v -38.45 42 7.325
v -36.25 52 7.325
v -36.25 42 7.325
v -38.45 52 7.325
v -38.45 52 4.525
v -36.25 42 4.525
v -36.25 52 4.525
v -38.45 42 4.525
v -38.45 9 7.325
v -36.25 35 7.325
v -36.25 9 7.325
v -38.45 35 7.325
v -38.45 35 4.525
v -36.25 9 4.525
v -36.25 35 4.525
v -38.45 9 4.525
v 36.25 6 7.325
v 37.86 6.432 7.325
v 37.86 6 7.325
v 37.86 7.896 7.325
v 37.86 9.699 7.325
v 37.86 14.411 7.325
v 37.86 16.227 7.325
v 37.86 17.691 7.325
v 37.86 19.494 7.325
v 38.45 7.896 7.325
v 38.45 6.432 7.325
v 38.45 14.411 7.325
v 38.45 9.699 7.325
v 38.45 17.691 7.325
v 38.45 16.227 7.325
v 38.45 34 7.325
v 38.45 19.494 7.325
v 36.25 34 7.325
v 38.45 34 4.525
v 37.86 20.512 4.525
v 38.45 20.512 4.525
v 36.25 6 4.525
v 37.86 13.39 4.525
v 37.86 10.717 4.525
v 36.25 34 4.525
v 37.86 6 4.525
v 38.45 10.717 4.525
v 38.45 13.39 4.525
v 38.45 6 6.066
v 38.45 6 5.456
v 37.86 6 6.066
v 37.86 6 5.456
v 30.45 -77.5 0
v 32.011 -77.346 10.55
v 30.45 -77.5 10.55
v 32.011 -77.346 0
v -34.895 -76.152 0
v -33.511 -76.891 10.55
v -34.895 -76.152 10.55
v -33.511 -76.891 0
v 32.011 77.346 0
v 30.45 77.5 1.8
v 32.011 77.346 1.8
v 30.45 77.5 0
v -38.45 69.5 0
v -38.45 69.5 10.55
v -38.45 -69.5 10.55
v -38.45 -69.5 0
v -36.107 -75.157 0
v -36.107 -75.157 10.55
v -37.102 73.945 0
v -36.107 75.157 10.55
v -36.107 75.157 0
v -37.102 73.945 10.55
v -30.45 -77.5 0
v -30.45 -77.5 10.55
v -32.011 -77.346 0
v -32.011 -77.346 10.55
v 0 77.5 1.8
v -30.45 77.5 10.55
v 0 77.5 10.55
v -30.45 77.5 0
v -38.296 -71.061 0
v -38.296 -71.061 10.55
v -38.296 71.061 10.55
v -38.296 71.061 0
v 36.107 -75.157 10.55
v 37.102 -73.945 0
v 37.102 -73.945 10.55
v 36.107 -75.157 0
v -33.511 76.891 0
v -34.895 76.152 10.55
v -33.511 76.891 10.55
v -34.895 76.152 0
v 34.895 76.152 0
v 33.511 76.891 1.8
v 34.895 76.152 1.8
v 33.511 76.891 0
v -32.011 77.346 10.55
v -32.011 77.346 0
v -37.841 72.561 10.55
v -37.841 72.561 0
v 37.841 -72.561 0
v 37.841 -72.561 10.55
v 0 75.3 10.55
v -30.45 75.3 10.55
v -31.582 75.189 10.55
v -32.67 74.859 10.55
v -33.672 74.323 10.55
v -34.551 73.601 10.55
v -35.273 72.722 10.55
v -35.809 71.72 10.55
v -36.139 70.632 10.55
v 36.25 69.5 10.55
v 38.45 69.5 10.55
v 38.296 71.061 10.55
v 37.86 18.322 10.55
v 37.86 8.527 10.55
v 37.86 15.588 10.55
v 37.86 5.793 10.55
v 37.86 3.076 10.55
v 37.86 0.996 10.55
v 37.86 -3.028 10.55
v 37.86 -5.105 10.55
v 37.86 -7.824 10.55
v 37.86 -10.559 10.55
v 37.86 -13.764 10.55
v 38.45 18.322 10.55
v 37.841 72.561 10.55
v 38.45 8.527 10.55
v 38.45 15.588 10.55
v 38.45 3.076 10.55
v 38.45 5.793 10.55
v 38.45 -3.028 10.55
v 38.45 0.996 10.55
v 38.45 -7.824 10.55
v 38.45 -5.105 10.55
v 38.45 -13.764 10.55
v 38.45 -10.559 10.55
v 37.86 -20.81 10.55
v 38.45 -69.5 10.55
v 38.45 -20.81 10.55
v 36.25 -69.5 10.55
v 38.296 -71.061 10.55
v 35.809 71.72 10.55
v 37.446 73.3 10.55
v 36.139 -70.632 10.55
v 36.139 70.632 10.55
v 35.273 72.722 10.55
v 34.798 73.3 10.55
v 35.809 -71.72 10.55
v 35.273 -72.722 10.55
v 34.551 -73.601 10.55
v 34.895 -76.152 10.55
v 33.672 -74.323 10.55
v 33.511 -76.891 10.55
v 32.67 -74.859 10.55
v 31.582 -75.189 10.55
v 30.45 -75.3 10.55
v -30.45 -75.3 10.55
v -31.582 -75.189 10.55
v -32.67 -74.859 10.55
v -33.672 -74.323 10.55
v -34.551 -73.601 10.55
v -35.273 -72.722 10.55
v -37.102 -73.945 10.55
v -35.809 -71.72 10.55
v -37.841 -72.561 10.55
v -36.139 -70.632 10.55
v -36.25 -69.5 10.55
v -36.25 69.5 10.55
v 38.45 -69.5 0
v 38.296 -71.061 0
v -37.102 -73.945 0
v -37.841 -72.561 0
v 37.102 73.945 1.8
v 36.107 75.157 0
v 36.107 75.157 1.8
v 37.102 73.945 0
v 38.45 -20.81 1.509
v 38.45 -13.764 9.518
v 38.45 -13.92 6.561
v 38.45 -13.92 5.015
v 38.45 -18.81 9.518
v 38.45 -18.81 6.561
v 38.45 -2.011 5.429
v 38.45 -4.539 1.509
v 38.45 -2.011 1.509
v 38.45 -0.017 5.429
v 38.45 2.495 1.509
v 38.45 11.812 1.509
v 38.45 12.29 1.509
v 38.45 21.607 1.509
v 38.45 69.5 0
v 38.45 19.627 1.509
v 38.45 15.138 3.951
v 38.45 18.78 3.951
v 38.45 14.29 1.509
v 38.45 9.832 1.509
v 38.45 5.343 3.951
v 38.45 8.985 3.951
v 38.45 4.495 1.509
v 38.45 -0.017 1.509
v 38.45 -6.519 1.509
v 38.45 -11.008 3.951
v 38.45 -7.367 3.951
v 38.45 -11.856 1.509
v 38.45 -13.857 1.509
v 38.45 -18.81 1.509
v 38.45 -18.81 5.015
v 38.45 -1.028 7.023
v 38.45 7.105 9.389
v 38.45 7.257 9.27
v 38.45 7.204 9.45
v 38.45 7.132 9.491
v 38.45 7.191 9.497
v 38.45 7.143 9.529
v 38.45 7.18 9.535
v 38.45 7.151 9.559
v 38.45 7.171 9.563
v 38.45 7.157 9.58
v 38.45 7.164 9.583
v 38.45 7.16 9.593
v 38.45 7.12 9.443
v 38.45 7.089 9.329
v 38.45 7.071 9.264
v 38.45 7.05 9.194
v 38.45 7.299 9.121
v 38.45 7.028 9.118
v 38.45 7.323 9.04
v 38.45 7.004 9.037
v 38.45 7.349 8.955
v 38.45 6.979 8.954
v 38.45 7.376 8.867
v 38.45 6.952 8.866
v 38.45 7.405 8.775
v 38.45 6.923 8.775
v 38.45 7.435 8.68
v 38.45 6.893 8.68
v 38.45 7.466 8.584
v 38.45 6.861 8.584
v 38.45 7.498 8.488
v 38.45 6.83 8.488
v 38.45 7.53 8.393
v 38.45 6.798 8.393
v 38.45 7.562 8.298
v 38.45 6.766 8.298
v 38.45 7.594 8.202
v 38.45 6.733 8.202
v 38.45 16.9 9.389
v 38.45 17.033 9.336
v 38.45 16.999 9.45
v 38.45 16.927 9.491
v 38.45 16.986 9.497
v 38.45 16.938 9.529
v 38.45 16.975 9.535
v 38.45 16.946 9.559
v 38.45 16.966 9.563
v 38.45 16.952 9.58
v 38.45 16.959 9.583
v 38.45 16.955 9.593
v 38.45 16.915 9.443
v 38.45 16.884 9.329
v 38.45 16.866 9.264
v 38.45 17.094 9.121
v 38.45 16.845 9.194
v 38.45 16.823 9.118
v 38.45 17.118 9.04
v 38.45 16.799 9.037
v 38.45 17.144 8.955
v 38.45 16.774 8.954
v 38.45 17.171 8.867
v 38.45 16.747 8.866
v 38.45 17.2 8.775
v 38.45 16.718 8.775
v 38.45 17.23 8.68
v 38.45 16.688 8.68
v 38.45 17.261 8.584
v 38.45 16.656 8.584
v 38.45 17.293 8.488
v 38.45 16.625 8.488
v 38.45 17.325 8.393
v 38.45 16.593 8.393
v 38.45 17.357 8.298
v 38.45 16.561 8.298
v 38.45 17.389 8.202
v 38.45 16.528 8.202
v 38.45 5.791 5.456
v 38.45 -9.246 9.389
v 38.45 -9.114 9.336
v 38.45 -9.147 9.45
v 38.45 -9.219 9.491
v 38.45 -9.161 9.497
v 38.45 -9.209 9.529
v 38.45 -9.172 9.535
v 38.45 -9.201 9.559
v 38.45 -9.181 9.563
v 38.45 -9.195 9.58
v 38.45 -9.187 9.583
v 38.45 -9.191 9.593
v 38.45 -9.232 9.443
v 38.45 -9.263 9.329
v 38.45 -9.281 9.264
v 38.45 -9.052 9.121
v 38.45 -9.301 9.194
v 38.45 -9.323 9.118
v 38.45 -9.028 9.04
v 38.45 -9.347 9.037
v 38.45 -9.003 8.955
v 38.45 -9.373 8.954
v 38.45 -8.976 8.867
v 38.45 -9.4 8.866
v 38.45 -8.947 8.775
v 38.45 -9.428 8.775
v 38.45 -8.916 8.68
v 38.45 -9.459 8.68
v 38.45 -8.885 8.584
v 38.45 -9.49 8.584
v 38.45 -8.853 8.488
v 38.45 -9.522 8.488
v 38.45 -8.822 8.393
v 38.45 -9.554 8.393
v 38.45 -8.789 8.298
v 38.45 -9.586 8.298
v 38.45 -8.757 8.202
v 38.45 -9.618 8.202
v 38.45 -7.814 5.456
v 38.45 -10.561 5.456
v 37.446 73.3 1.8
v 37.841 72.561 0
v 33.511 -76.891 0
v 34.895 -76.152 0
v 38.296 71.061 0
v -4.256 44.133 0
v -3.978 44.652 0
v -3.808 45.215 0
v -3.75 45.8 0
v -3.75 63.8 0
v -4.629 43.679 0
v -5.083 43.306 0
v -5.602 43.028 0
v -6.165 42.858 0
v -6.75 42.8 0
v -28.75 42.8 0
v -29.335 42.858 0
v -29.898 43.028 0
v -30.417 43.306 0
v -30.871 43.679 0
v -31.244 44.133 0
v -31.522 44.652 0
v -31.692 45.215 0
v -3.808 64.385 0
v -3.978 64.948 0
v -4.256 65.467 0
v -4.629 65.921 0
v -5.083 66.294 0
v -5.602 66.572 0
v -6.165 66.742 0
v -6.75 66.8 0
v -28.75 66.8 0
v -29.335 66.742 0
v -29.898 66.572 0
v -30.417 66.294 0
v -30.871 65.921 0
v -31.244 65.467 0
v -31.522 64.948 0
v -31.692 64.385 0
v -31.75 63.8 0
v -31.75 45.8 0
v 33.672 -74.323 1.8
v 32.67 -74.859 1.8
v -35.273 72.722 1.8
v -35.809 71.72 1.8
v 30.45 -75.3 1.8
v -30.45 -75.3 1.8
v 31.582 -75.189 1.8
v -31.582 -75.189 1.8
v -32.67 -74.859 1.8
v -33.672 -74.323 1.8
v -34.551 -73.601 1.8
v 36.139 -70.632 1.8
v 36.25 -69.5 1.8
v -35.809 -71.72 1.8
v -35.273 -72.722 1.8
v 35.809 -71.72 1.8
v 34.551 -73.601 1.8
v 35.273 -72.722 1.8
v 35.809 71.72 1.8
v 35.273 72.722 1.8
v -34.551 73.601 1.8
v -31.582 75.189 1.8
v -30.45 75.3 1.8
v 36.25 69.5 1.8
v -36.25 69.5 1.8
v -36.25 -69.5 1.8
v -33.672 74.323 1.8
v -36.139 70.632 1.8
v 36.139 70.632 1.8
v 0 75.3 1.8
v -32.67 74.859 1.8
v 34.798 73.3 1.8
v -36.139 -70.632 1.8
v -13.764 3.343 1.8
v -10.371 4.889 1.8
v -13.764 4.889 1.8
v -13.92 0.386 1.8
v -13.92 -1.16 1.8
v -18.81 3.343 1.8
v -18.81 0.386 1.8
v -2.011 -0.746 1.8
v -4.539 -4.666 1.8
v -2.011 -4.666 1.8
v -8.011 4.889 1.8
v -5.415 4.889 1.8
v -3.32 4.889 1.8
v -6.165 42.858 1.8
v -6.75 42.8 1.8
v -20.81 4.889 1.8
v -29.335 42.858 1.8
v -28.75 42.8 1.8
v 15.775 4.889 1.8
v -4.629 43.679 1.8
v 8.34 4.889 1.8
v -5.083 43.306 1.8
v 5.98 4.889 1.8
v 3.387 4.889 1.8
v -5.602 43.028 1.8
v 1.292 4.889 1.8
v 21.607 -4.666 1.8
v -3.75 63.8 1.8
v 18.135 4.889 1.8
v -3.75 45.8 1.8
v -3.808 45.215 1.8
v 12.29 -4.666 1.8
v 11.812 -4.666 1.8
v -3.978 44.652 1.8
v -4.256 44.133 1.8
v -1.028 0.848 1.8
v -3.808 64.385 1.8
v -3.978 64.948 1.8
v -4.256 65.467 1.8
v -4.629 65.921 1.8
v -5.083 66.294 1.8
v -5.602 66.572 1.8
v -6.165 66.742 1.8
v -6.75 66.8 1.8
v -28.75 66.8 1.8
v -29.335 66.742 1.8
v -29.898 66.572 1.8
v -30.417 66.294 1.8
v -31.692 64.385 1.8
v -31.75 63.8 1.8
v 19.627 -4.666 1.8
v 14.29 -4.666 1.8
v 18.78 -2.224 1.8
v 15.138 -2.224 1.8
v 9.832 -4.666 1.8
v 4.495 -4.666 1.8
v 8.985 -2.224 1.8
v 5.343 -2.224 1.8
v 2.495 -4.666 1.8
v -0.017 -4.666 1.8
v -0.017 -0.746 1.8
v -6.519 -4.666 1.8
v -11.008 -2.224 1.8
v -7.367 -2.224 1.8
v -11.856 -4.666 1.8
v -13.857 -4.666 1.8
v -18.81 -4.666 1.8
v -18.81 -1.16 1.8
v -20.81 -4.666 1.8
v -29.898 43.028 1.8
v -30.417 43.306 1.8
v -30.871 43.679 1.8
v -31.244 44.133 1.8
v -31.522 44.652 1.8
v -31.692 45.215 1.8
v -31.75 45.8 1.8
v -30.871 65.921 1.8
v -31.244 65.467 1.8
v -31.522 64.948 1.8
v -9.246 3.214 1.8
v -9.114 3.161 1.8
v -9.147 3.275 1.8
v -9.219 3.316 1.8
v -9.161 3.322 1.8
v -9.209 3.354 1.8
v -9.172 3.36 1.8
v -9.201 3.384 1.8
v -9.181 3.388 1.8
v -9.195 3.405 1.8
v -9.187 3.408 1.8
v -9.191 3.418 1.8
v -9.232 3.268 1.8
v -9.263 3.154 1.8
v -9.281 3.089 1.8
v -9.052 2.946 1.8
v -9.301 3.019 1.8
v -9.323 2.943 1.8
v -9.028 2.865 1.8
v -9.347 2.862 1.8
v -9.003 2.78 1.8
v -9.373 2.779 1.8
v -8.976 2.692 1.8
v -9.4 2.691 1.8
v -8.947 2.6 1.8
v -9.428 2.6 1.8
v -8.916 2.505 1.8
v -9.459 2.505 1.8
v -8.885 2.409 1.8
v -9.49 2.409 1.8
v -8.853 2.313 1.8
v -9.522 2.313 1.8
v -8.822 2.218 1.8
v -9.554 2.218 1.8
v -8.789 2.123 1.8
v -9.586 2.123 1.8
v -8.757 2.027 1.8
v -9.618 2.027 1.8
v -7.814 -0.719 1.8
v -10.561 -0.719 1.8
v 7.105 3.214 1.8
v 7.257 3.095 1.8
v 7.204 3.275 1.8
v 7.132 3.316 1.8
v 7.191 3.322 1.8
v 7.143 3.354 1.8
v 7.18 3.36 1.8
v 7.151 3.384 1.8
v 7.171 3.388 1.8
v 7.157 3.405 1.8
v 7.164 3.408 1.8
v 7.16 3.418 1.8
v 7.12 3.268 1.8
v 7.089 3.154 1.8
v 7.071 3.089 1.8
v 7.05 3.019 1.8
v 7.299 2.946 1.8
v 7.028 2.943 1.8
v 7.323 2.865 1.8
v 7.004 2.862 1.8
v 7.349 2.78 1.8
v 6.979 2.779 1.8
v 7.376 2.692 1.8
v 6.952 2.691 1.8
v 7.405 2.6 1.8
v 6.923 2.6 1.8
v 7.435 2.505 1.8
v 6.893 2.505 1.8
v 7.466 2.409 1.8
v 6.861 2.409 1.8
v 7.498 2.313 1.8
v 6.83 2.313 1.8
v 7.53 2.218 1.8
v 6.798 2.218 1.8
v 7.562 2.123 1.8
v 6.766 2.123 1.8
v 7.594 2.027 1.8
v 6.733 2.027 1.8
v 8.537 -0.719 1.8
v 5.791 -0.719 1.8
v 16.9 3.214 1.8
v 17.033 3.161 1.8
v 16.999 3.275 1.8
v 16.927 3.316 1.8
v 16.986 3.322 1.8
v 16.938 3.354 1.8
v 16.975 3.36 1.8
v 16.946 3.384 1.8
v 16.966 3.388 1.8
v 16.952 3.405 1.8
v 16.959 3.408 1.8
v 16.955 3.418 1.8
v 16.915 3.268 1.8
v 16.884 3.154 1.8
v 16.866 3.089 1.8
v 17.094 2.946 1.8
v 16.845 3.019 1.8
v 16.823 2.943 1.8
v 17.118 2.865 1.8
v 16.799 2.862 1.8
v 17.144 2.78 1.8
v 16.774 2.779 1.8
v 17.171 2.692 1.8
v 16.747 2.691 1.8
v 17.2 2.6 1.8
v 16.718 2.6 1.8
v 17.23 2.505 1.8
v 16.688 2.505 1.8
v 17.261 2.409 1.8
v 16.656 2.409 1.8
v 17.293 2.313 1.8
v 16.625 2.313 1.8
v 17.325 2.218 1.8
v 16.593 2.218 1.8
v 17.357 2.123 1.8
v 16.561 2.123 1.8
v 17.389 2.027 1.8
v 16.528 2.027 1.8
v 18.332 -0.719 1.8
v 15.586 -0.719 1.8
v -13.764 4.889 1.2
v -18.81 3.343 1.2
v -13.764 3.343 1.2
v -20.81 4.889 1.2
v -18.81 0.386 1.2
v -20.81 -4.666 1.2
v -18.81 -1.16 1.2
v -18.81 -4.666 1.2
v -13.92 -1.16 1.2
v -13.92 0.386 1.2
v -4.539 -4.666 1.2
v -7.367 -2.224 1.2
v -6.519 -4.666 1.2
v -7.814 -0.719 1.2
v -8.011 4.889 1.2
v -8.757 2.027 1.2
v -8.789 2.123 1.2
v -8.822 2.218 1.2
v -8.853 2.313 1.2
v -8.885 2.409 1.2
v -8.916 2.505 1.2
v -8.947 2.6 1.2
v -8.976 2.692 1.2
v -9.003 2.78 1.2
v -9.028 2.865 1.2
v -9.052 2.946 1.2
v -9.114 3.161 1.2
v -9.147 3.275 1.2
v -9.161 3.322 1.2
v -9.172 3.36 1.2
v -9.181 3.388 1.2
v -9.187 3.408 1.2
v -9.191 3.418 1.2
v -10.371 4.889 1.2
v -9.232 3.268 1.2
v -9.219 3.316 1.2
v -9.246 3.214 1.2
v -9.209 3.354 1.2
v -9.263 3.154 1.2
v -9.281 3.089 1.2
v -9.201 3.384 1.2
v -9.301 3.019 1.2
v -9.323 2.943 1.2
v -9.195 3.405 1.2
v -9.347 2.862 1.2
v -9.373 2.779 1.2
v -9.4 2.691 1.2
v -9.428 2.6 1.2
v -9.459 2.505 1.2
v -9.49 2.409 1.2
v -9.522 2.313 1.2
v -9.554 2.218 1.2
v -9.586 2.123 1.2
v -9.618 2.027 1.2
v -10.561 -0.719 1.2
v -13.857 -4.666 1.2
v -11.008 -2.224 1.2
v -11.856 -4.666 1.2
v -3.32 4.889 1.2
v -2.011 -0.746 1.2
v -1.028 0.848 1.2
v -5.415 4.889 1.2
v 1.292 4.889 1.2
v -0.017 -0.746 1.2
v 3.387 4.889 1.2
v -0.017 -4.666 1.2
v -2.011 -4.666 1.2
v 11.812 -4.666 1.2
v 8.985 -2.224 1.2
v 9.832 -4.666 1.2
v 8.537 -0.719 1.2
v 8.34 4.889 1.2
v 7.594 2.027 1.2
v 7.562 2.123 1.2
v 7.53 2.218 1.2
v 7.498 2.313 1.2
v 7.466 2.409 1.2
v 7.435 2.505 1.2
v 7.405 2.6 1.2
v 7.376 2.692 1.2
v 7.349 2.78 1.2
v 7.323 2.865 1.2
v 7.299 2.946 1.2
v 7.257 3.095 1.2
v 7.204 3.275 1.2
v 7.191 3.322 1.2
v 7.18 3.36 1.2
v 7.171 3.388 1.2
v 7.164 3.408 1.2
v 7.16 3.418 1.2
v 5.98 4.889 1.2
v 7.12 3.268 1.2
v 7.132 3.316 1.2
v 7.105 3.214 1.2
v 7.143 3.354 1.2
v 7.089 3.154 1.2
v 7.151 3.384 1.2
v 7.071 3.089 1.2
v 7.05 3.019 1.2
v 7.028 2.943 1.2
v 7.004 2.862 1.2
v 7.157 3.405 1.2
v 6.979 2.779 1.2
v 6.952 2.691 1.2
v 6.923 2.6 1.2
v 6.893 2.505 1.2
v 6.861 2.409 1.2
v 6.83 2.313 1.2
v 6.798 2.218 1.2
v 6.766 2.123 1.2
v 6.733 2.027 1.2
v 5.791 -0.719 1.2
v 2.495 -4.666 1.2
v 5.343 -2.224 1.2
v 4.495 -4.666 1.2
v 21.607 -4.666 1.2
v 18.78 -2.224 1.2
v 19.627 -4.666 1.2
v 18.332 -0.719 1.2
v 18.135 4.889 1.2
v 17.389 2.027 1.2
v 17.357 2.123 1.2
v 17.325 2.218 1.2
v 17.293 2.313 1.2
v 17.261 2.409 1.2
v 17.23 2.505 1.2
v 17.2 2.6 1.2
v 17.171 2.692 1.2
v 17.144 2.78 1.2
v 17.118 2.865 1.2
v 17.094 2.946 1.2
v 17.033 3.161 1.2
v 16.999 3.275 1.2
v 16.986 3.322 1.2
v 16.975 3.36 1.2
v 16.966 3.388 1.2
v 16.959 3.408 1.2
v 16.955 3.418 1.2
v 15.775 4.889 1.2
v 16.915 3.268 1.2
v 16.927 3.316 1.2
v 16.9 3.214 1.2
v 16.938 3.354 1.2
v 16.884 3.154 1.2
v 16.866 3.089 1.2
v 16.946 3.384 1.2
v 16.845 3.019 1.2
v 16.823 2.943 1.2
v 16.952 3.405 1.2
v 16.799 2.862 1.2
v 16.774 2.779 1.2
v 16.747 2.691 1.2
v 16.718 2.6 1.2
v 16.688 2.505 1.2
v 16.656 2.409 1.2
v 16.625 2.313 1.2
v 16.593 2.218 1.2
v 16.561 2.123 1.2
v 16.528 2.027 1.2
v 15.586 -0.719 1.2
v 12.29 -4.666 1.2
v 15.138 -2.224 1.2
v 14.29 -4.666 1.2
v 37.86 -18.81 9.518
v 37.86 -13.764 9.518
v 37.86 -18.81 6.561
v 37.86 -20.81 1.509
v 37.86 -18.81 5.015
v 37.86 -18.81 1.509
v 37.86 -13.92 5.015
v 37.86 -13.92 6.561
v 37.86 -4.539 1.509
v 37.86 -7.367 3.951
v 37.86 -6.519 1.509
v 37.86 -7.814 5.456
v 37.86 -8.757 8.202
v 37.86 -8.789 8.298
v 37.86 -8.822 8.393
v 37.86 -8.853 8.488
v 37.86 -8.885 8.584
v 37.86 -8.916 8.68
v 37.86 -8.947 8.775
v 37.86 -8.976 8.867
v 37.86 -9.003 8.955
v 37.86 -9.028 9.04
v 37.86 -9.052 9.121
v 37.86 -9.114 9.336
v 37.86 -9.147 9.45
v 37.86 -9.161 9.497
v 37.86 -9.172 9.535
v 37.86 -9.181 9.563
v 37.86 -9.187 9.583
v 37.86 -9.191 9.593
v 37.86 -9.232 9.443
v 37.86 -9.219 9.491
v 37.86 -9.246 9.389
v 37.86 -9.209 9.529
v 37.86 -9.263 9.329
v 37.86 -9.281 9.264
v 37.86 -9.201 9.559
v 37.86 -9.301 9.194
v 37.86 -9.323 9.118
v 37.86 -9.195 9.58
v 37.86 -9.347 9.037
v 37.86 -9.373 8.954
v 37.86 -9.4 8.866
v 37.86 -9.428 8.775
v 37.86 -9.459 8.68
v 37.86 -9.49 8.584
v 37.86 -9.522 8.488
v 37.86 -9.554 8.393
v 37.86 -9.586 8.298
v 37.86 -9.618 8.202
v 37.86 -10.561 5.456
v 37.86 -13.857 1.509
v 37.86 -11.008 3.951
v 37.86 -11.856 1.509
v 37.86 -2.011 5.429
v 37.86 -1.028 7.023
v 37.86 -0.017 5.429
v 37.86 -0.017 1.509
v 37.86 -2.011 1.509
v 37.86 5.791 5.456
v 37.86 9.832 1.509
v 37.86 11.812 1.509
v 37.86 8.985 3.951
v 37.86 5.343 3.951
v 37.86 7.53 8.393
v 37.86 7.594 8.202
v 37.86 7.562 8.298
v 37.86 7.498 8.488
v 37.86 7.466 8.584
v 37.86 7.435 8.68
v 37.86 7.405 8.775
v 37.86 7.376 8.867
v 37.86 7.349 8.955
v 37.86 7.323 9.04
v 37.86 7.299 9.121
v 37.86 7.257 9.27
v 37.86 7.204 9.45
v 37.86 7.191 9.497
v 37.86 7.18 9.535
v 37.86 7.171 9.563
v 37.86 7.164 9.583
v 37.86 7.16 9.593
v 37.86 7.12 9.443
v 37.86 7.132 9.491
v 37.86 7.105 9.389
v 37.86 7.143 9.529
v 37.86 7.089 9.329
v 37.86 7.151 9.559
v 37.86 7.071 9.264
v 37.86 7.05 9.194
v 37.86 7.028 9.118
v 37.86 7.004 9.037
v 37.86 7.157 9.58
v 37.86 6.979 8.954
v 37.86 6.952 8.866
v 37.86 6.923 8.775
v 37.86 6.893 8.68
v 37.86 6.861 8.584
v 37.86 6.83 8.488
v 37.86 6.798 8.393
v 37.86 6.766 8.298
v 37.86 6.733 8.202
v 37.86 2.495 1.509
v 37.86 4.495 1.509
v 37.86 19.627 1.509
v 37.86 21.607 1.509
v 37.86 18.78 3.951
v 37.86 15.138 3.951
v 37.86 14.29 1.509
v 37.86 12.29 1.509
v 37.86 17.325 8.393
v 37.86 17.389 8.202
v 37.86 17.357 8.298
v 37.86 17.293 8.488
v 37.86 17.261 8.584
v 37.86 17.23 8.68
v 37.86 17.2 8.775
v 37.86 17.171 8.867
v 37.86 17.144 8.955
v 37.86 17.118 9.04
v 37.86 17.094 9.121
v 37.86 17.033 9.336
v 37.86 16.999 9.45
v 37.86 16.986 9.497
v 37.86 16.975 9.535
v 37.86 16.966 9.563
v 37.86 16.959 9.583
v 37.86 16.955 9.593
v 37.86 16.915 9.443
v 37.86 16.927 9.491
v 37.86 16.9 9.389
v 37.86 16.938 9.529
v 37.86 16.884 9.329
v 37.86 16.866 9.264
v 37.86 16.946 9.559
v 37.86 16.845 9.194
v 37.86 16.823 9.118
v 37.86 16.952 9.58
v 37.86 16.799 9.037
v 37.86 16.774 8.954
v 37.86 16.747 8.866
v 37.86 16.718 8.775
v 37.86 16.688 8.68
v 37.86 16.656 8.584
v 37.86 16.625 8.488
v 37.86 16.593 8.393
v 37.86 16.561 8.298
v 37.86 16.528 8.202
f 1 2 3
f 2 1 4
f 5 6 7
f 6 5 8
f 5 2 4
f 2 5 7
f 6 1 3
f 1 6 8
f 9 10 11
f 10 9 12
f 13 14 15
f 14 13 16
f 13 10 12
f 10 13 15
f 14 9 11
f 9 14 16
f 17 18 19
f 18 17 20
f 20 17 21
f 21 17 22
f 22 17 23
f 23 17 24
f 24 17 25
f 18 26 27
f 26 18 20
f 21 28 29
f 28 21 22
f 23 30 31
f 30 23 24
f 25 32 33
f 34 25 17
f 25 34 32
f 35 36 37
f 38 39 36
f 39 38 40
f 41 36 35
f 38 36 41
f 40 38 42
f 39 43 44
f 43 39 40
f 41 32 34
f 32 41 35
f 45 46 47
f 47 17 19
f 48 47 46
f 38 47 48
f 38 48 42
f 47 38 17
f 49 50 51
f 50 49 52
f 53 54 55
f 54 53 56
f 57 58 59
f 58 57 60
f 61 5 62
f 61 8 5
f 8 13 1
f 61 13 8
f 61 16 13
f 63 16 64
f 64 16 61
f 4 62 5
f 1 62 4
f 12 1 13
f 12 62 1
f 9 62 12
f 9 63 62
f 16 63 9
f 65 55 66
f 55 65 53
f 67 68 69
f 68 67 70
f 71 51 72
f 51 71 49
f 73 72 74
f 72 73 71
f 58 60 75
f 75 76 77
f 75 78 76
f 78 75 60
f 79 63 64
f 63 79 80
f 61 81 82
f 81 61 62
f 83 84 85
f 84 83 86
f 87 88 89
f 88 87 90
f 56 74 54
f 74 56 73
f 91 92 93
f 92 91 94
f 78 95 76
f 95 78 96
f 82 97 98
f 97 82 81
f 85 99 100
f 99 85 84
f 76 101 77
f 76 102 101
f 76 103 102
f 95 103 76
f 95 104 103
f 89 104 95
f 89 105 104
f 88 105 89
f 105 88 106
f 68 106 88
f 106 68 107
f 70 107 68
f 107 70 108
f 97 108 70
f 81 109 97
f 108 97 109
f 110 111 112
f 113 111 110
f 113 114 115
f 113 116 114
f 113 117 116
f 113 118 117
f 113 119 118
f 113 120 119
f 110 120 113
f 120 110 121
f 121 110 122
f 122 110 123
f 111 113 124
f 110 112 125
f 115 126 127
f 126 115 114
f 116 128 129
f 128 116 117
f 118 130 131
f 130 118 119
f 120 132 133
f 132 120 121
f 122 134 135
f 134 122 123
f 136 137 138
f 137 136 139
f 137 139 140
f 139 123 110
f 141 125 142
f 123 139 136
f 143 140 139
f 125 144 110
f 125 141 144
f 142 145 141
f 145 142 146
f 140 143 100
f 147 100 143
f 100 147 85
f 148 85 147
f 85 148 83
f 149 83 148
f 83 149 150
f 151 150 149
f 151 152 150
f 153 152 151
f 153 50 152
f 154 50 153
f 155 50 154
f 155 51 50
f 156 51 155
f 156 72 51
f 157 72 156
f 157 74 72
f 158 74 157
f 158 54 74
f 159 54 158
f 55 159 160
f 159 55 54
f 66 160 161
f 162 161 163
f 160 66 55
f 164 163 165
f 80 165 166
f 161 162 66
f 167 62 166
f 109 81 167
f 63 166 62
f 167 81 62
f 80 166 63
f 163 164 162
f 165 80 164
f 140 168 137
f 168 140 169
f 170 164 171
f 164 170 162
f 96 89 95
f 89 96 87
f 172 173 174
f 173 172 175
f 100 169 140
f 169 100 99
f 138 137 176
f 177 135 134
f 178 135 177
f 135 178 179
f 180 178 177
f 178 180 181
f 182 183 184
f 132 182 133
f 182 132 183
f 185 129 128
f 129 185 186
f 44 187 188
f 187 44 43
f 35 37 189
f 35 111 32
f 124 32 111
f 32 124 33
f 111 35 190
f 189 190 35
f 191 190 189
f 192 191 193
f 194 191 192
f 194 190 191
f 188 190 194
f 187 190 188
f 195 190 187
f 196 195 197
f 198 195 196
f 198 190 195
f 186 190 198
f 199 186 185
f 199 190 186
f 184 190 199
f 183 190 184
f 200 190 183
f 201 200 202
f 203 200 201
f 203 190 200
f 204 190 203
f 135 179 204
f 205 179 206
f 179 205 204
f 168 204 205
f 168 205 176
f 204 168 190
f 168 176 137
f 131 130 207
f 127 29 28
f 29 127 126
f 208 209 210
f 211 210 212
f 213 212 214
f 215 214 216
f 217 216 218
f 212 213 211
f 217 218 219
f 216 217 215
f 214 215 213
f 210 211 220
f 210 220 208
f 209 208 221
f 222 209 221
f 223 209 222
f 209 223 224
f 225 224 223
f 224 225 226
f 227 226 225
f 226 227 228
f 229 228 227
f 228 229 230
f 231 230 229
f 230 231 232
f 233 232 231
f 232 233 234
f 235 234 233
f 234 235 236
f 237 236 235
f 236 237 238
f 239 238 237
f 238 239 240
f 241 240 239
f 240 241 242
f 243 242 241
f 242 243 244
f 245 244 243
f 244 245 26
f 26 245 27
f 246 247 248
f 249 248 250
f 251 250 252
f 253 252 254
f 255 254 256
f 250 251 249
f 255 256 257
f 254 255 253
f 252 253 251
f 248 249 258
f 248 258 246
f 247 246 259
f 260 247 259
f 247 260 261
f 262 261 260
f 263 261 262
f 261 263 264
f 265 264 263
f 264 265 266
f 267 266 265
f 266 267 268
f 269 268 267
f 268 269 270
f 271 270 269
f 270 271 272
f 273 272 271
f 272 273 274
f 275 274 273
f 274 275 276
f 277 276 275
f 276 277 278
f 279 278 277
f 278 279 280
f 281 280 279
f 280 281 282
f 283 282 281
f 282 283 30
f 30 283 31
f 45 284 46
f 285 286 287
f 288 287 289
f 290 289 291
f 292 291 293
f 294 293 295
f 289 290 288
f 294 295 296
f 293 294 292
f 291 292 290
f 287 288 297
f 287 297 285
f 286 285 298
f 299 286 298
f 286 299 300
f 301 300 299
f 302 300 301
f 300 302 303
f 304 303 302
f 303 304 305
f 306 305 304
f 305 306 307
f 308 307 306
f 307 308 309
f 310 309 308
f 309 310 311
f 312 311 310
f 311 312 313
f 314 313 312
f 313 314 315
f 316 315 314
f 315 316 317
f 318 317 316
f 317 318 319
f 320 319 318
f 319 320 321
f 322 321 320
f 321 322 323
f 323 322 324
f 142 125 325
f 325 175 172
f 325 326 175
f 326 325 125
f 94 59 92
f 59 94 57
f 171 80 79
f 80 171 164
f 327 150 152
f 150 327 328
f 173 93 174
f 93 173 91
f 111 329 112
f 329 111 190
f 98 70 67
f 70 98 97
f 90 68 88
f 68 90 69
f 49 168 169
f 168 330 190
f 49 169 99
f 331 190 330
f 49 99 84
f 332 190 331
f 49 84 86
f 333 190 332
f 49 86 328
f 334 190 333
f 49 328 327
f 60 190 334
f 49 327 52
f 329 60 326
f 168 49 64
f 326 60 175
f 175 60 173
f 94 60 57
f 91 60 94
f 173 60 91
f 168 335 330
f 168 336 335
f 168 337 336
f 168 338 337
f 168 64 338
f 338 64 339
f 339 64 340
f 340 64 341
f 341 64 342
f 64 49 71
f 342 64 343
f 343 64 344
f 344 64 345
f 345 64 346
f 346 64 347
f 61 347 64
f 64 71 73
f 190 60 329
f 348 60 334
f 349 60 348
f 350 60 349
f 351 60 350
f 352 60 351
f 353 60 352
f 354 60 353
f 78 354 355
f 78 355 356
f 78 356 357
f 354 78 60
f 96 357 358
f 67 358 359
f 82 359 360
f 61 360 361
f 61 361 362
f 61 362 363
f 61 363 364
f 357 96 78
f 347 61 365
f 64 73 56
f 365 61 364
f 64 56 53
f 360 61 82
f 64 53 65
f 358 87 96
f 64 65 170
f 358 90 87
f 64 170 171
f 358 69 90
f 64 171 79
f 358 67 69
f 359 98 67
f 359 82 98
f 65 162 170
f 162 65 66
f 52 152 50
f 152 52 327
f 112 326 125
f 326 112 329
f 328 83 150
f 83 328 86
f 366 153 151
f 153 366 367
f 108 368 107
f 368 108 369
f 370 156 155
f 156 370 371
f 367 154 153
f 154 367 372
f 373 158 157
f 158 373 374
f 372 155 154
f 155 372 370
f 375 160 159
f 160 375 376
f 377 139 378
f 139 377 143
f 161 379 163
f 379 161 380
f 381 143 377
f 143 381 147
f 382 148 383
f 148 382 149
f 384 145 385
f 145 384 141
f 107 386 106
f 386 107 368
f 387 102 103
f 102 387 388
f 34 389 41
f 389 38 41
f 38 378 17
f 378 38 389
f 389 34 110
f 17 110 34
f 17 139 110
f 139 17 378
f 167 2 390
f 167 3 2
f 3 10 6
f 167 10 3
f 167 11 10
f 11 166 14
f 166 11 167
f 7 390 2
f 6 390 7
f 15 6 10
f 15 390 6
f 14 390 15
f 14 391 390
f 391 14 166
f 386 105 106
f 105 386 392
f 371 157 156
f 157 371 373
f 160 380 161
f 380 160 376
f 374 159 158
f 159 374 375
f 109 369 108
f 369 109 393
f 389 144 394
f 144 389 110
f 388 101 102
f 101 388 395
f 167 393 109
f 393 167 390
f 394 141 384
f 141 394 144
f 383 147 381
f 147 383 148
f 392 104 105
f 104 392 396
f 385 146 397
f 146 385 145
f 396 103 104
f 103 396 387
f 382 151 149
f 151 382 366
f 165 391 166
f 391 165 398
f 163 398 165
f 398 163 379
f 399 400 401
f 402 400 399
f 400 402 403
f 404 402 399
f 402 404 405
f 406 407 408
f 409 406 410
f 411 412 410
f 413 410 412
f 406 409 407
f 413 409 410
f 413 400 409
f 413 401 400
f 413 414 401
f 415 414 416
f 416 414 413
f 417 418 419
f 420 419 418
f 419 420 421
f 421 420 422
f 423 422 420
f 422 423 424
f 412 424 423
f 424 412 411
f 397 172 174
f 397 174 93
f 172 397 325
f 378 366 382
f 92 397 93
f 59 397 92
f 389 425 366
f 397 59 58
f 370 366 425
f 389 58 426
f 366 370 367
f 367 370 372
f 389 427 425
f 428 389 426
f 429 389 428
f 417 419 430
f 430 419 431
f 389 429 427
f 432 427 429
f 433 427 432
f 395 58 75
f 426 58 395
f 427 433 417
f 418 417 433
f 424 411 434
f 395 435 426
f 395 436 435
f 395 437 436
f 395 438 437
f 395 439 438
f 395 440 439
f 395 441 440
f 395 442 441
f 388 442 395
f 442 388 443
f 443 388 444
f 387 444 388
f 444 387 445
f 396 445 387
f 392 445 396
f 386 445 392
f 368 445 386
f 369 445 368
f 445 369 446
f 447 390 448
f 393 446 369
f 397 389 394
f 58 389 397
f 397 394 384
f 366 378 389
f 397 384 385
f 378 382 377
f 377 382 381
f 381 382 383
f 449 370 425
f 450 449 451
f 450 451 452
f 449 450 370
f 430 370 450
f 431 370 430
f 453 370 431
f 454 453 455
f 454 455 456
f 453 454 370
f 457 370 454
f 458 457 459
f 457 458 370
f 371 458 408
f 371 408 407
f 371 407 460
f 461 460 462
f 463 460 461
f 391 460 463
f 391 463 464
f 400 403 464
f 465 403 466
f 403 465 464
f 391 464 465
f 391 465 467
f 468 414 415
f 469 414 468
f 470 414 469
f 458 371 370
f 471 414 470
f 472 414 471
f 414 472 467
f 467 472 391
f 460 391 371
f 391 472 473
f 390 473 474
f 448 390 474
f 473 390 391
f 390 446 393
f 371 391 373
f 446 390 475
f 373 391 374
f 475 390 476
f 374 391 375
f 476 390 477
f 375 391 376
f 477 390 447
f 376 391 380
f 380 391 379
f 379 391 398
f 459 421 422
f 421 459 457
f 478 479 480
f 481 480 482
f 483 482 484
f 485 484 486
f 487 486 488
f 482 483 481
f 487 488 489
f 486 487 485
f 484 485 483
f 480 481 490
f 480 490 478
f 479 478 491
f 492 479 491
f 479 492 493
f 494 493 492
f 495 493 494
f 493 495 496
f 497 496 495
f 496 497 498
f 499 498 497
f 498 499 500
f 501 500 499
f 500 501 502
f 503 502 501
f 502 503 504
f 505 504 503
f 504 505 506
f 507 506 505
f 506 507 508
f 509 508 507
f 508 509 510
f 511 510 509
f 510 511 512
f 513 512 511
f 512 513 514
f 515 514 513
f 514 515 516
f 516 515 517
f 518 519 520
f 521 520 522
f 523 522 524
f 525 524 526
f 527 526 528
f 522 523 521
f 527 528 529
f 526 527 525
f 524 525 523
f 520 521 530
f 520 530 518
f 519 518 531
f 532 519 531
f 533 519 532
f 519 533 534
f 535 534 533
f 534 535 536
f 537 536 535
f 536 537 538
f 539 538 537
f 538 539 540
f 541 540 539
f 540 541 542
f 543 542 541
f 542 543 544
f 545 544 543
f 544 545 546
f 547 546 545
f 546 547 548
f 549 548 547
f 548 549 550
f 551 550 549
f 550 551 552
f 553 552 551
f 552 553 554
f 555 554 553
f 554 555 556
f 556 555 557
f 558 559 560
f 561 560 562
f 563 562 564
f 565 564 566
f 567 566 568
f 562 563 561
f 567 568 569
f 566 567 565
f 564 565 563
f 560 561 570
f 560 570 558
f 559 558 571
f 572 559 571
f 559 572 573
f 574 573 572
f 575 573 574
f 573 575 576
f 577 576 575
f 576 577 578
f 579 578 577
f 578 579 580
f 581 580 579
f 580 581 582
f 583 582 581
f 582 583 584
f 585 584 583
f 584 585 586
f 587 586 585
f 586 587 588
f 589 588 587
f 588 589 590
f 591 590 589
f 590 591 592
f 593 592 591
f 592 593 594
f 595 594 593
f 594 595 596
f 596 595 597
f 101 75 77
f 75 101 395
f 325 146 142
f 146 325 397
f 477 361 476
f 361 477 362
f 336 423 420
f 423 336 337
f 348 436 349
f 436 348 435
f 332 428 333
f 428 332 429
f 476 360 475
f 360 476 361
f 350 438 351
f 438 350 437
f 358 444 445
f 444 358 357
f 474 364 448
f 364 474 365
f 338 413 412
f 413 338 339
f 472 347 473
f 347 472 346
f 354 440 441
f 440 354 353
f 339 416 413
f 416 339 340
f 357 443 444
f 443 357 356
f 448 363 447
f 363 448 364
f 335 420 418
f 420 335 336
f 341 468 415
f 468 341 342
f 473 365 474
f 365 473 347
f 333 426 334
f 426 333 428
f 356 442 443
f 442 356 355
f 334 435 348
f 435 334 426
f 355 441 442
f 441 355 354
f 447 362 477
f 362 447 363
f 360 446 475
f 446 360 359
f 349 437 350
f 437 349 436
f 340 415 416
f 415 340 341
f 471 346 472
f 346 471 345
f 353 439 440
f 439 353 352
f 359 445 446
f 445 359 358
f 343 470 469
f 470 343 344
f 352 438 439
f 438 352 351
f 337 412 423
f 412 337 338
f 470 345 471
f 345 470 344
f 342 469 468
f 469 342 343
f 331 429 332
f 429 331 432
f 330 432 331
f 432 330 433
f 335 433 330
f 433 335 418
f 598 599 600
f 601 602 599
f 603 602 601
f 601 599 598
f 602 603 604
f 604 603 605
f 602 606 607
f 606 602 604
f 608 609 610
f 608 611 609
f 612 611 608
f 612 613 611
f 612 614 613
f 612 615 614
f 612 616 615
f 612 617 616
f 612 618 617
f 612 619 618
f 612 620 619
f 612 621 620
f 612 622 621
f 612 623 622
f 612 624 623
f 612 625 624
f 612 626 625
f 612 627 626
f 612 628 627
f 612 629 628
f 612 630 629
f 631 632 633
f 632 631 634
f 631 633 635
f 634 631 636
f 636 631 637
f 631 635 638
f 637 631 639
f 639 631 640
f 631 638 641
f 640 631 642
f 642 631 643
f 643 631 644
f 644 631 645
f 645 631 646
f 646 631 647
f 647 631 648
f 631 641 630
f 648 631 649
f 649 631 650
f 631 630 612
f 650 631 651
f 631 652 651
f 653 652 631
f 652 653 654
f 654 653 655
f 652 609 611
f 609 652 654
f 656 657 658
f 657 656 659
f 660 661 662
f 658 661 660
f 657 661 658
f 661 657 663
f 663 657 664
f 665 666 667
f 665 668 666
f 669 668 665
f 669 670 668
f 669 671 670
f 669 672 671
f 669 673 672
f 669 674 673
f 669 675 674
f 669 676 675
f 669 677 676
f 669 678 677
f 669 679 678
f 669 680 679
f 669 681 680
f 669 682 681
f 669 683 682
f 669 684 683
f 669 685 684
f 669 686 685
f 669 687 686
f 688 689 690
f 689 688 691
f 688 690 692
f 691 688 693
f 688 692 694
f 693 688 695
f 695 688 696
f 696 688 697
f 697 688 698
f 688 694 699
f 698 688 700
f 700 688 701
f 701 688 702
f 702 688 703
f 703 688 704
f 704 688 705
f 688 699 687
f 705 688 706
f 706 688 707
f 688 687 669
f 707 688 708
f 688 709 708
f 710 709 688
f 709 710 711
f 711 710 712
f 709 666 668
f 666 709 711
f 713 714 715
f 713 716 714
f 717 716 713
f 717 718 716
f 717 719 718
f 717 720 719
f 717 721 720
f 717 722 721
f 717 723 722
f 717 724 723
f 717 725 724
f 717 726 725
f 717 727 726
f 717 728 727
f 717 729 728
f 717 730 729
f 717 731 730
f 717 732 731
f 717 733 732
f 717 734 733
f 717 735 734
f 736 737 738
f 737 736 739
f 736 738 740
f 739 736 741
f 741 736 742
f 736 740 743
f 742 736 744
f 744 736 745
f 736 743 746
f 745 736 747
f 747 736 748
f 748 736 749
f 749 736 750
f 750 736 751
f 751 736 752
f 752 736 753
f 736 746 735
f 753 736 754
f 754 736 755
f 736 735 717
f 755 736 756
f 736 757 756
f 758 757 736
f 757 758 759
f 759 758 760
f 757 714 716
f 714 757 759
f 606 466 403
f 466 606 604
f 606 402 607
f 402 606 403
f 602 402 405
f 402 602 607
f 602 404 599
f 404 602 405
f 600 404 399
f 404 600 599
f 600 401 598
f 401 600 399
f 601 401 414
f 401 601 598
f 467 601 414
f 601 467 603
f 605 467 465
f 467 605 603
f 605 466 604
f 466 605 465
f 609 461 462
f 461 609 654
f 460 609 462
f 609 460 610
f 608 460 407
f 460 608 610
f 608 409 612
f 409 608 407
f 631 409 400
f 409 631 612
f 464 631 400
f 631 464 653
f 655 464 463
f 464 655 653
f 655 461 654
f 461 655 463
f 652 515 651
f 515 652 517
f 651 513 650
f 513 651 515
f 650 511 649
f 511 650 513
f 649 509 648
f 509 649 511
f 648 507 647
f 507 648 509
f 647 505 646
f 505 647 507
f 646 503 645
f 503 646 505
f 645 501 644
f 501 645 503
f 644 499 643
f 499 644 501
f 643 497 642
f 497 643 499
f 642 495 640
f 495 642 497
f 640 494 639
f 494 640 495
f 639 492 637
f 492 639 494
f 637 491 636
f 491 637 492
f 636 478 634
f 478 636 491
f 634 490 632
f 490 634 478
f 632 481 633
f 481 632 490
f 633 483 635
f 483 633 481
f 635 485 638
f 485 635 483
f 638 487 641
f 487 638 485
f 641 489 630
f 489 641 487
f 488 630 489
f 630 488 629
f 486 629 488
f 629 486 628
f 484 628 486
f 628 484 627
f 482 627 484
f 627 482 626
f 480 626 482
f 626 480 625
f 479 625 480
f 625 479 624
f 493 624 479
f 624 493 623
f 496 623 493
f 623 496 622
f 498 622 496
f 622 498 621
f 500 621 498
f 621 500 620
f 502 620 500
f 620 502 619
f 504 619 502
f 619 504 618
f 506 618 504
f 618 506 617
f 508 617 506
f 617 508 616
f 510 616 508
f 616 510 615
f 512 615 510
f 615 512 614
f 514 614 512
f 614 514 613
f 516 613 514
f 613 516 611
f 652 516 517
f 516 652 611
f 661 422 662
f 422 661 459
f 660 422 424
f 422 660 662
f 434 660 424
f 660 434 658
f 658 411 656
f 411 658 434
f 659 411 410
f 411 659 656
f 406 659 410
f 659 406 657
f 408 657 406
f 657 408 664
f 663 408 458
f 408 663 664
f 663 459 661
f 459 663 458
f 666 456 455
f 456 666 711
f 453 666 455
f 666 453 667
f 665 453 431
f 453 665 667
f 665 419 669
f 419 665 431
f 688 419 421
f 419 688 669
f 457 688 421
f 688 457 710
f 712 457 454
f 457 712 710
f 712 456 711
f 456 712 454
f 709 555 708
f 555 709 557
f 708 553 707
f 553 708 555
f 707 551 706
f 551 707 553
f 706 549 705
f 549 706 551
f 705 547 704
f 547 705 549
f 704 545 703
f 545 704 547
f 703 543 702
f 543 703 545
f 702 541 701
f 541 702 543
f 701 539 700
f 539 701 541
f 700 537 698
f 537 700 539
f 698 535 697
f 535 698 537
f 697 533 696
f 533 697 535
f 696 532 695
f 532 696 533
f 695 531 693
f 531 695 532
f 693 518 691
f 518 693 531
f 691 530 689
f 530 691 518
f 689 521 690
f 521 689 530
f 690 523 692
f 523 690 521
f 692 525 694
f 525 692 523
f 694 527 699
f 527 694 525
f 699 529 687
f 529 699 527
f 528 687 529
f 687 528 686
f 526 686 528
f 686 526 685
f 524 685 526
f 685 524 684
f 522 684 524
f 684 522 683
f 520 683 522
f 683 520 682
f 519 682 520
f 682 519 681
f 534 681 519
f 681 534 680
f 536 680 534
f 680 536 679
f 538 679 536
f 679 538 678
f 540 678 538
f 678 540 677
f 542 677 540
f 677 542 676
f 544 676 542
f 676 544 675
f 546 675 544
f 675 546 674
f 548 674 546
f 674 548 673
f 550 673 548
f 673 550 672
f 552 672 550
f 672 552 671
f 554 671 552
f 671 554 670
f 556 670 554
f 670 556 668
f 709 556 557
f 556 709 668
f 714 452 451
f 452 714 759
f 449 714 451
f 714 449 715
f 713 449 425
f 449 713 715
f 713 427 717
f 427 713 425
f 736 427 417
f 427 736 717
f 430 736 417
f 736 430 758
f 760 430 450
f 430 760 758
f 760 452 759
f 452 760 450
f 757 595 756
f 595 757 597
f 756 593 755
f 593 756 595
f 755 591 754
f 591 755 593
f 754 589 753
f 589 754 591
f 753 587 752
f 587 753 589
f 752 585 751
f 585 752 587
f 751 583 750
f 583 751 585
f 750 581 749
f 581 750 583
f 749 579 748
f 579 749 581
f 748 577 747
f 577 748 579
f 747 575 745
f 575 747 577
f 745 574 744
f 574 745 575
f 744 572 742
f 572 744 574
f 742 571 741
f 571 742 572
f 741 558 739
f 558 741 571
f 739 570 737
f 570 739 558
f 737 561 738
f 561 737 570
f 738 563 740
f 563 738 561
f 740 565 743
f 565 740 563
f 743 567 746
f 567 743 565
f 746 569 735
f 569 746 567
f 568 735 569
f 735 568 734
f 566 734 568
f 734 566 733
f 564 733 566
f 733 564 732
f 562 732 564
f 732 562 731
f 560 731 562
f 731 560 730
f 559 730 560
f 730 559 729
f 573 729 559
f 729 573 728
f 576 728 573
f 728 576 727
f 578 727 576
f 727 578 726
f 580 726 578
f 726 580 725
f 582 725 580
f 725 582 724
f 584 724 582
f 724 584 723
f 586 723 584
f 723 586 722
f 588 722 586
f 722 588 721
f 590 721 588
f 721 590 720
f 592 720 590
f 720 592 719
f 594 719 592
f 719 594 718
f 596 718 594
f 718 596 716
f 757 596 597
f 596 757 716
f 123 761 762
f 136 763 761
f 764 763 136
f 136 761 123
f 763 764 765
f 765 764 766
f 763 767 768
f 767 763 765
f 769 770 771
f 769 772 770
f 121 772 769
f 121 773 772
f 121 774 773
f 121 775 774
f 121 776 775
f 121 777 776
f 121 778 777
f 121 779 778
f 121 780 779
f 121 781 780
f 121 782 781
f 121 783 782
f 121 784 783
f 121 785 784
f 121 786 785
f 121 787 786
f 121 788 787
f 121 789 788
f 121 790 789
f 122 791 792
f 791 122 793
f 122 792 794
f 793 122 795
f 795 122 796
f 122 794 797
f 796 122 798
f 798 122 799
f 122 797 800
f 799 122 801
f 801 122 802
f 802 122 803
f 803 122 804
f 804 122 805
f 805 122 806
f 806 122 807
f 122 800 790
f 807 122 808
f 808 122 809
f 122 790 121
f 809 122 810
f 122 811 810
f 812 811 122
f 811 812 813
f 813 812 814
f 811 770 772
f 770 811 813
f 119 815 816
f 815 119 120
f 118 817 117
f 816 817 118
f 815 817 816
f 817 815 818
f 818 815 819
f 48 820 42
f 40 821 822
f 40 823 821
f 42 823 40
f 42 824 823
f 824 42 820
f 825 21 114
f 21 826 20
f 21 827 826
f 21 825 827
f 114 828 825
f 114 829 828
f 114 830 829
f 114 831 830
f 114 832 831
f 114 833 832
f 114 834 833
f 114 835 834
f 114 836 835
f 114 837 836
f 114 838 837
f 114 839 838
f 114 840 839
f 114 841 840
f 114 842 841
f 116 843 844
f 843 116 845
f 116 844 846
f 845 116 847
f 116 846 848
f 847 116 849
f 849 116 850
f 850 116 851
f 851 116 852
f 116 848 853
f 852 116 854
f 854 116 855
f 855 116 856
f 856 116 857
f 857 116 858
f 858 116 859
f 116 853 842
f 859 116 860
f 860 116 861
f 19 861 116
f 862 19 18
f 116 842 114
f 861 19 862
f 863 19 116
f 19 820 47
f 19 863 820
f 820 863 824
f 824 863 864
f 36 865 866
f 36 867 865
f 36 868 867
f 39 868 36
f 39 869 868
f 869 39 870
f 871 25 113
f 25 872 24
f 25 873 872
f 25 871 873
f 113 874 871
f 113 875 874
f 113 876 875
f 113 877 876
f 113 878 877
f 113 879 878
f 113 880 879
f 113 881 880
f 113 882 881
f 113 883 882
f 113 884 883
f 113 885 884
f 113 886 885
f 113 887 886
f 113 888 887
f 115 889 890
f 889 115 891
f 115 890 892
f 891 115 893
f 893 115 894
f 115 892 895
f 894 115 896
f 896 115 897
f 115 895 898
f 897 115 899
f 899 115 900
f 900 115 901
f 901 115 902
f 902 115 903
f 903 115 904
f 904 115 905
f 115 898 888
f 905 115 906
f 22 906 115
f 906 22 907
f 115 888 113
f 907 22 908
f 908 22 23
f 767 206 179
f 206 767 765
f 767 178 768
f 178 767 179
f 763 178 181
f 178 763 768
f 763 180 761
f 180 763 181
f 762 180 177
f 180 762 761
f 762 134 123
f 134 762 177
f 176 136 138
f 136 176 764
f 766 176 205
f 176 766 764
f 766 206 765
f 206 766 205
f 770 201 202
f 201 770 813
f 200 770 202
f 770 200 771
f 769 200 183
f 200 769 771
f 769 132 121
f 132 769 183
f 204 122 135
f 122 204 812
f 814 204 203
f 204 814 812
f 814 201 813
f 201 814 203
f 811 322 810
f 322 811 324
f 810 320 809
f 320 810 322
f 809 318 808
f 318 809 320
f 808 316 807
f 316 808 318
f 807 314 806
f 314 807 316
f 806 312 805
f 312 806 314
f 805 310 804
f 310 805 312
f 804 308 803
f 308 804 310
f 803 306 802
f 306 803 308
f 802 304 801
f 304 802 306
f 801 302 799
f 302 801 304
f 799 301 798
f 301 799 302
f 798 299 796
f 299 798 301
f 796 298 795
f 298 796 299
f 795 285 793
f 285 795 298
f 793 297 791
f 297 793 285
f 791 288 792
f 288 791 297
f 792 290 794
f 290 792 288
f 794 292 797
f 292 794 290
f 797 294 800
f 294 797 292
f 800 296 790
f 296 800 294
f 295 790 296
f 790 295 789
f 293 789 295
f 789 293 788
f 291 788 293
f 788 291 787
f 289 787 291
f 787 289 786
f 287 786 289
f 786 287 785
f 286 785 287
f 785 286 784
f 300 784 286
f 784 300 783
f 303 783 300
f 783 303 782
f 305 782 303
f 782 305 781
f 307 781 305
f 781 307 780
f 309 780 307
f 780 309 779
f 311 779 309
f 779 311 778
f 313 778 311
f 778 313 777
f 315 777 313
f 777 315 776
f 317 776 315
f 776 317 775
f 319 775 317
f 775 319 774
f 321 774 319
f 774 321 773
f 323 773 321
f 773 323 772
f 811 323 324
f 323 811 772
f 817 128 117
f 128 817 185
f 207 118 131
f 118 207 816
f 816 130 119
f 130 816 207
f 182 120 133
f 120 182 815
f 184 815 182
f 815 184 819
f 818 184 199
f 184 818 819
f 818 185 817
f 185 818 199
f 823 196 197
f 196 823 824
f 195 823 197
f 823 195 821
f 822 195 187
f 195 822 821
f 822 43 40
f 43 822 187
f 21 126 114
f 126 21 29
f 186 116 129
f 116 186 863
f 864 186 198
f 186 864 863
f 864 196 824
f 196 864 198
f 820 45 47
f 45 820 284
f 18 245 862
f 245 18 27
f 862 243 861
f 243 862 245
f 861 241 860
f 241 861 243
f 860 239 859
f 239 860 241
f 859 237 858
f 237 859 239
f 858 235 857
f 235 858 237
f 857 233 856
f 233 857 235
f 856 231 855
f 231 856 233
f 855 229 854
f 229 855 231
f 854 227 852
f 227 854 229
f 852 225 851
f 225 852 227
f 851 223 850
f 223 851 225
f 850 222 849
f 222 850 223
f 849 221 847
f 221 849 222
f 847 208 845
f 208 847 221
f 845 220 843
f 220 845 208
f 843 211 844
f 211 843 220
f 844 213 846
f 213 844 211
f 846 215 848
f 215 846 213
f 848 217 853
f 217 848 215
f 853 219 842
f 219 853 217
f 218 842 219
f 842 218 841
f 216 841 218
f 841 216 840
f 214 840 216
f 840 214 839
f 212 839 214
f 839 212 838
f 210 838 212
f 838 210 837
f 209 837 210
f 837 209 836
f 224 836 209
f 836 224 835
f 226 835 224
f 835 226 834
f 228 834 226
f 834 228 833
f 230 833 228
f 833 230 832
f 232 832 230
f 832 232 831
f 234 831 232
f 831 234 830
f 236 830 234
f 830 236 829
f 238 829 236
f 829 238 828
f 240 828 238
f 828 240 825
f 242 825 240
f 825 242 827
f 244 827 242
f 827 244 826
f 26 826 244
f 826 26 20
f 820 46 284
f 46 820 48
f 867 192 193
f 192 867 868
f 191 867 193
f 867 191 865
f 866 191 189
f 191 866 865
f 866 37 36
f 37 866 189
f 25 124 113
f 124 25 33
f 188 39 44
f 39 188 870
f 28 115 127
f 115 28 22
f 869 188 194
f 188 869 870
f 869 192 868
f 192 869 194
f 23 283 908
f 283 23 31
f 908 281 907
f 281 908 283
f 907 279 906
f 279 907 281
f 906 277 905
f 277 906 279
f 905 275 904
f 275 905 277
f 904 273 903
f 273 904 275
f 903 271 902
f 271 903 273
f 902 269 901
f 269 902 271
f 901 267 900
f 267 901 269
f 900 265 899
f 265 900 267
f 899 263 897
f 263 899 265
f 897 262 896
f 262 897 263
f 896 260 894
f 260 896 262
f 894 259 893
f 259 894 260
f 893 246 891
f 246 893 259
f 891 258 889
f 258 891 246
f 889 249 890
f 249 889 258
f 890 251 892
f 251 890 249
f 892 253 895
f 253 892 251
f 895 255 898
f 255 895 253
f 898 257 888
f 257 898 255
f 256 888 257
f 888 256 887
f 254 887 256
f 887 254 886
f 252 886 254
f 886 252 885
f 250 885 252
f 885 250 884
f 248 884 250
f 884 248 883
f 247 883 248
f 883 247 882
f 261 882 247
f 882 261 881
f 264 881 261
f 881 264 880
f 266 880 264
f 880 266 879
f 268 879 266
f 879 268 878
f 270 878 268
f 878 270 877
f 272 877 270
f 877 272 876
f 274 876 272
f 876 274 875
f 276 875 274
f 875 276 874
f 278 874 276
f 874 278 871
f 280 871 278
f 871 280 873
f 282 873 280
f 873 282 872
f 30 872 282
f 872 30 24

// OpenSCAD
// Basic iPhone 16 snap-on case approximation
// All dimensions are in millimeters.
// IMPORTANT: These values are approximate and should be verified against
// official Apple accessory drawings or measured hardware before printing.
// This model is intended as a simple starting point, not a production-ready case.

$fn = 32;

// --- Phone and case parameters ---
phone_length = 149.6;
phone_width = 71.5;
phone_thickness = 8.25;
clearance = 0.5;
wall_thickness = 2.2;
back_thickness = 1.8;
corner_radius = 8.0;

// Small rim left at the top and bottom of the open-ended shell.
// Increase this if the side rails feel too flexible.
end_lip = 4.0;

// --- Closed bottom parameters ---
// Continuous bottom band improves drop protection but blocks port access while installed.
closed_bottom = true;

// --- Camera cutout parameters ---
// Approximate rounded-rectangle placeholder near the rear top-left.
camera_cutout_width = 28.0;
camera_cutout_height = 24.0;
camera_cutout_radius = 3.0;
camera_cutout_x = -phone_width / 2 + 18.0;
camera_cutout_y = phone_length / 2 - 20.0;
camera_cutout_extra = 0.4;

// --- Button cutout parameters ---
// Positions are approximate distances from case center.
volume_slot_width = 2.8;
volume_slot_height = 26.0;
volume_slot_y = 22.0;

mute_slot_width = 2.8;
mute_slot_height = 10.0;
mute_slot_y = 47.0;

power_slot_width = 2.8;
power_slot_height = 28.0;
power_slot_y = 20.0;

// --- Inner back engraving parameters ---
// Recessed text is subtracted into the interior back wall.
// Keep inner_engraving_depth less than back_thickness so it cannot break through.
enable_inner_engraving = true;
inner_engraving_text = "FAYAA";
inner_engraving_depth = 0.6;
inner_engraving_size = 10.0;
inner_engraving_offset_x = 0.0;
inner_engraving_offset_y = 0.0;
inner_engraving_font = "Liberation Sans:style=Bold";

// --- Side engraving parameters ---
// Recessed text is subtracted from the right exterior side wall.
// If it is hidden by a button slot, adjust side_engraving_offset_y.
enable_side_engraving = true;
side_engraving_text = "FAYAA";
side_engraving_depth = 0.6;
side_engraving_size = 10.0;
side_engraving_offset_x = 0.0;
side_engraving_offset_y = 0.0;
side_engraving_font = "Liberation Sans:style=Bold";

button_slot_depth_extra = 2.0;
button_slot_z = back_thickness + phone_thickness / 2;

// --- Derived dimensions ---
inner_length = phone_length + 2 * clearance;
inner_width = phone_width + 2 * clearance;
inner_depth = phone_thickness + clearance;

outer_length = inner_length + 2 * wall_thickness;
outer_width = inner_width + 2 * wall_thickness;
outer_depth = back_thickness + inner_depth;

// --- Helpers ---
module rounded_rect_2d(size = [10, 10], radius = 2) {
    safe_radius = min(radius, min(size[0], size[1]) / 2 - 0.01);

    // Offset is quick for this simple 2D profile and avoids expensive 3D minkowski.
    offset(r = safe_radius)
        square([size[0] - 2 * safe_radius, size[1] - 2 * safe_radius], center = true);
}

module rounded_box(size = [10, 10, 2], radius = 2) {
    linear_extrude(height = size[2])
        rounded_rect_2d([size[0], size[1]], radius);
}

module case_outer_shell() {
    rounded_box([outer_width, outer_length, outer_depth], corner_radius);
}

module phone_cavity() {
    // Starts above the back plate, leaving a back_thickness rear panel.
    translate([0, 0, back_thickness])
        rounded_box([
            inner_width,
            inner_length,
            inner_depth + 0.2
        ], max(corner_radius - wall_thickness, 1));
}

module open_top_cutout() {
    // Remove only the top wall band while keeping the bottom lip for protection.
    slot_length = wall_thickness * 2 + end_lip + 0.2;

    translate([0, outer_length / 2 - slot_length / 2 + 0.1, back_thickness])
        cube([outer_width + 2, slot_length, outer_depth + 1], center = false);
}

module bottom_cutouts() {
    if (!closed_bottom) {
        // Optional full bottom opening for variants that need cable access.
        translate([-(outer_width + 2) / 2, -outer_length / 2 - 0.1, back_thickness])
            cube([outer_width + 2, wall_thickness + end_lip + 0.2, outer_depth + 1], center = false);
    }
}

module rear_camera_cutout() {
    translate([camera_cutout_x, camera_cutout_y, -0.1])
        linear_extrude(height = back_thickness + camera_cutout_extra)
            rounded_rect_2d(
                [camera_cutout_width, camera_cutout_height],
                camera_cutout_radius
            );
}

module left_side_slot(y_pos, slot_height) {
    translate([
        -outer_width / 2 - 0.1,
        y_pos - slot_height / 2,
        button_slot_z - volume_slot_width / 2
    ])
        cube([
            wall_thickness + button_slot_depth_extra,
            slot_height,
            volume_slot_width
        ], center = false);
}

module right_side_slot(y_pos, slot_height) {
    translate([
        outer_width / 2 - wall_thickness - button_slot_depth_extra + 0.1,
        y_pos - slot_height / 2,
        button_slot_z - power_slot_width / 2
    ])
        cube([
            wall_thickness + button_slot_depth_extra,
            slot_height,
            power_slot_width
        ], center = false);
}

module button_cutouts() {
    // Left edge: mute switch and volume buttons.
    left_side_slot(mute_slot_y, mute_slot_height);
    left_side_slot(volume_slot_y, volume_slot_height);

    // Right edge: power button.
    right_side_slot(power_slot_y, power_slot_height);
}

module inner_back_engraving_cutout() {
    if (enable_inner_engraving) {
        safe_inner_depth = min(inner_engraving_depth, back_thickness - 0.2);

        // On the inner back wall: reads correctly when looking into the case from above.
        translate([
            inner_engraving_offset_x,
            inner_engraving_offset_y,
            back_thickness - safe_inner_depth
        ])
            linear_extrude(height = safe_inner_depth + 0.01)
                text(
                    inner_engraving_text,
                    size = inner_engraving_size,
                    font = inner_engraving_font,
                    halign = "center",
                    valign = "center"
                );
    }
}

module side_engraving_cutout() {
    if (enable_side_engraving) {
        safe_side_depth = min(side_engraving_depth, wall_thickness - 0.2);

        // On the right exterior side wall: reads horizontally from outside the case.
        // side_engraving_offset_x moves along case length; side_engraving_offset_y moves up/down thickness.
        translate([
            outer_width / 2 - safe_side_depth + 0.01,
            side_engraving_offset_x,
            back_thickness + inner_depth / 2 + side_engraving_offset_y
        ])
            rotate([90, 0, 90])
                linear_extrude(height = safe_side_depth + 0.02)
                    text(
                        side_engraving_text,
                        size = side_engraving_size,
                        font = side_engraving_font,
                        halign = "center",
                        valign = "center"
                    );
    }
}

// --- Main model ---
// Coordinate convention:
// X = width, Y = length, Z = thickness. Back plate lies at Z = 0..back_thickness.

difference() {
    case_outer_shell();
    phone_cavity();
    open_top_cutout();
    bottom_cutouts();
    rear_camera_cutout();
    button_cutouts();
    inner_back_engraving_cutout();
    side_engraving_cutout();
}
